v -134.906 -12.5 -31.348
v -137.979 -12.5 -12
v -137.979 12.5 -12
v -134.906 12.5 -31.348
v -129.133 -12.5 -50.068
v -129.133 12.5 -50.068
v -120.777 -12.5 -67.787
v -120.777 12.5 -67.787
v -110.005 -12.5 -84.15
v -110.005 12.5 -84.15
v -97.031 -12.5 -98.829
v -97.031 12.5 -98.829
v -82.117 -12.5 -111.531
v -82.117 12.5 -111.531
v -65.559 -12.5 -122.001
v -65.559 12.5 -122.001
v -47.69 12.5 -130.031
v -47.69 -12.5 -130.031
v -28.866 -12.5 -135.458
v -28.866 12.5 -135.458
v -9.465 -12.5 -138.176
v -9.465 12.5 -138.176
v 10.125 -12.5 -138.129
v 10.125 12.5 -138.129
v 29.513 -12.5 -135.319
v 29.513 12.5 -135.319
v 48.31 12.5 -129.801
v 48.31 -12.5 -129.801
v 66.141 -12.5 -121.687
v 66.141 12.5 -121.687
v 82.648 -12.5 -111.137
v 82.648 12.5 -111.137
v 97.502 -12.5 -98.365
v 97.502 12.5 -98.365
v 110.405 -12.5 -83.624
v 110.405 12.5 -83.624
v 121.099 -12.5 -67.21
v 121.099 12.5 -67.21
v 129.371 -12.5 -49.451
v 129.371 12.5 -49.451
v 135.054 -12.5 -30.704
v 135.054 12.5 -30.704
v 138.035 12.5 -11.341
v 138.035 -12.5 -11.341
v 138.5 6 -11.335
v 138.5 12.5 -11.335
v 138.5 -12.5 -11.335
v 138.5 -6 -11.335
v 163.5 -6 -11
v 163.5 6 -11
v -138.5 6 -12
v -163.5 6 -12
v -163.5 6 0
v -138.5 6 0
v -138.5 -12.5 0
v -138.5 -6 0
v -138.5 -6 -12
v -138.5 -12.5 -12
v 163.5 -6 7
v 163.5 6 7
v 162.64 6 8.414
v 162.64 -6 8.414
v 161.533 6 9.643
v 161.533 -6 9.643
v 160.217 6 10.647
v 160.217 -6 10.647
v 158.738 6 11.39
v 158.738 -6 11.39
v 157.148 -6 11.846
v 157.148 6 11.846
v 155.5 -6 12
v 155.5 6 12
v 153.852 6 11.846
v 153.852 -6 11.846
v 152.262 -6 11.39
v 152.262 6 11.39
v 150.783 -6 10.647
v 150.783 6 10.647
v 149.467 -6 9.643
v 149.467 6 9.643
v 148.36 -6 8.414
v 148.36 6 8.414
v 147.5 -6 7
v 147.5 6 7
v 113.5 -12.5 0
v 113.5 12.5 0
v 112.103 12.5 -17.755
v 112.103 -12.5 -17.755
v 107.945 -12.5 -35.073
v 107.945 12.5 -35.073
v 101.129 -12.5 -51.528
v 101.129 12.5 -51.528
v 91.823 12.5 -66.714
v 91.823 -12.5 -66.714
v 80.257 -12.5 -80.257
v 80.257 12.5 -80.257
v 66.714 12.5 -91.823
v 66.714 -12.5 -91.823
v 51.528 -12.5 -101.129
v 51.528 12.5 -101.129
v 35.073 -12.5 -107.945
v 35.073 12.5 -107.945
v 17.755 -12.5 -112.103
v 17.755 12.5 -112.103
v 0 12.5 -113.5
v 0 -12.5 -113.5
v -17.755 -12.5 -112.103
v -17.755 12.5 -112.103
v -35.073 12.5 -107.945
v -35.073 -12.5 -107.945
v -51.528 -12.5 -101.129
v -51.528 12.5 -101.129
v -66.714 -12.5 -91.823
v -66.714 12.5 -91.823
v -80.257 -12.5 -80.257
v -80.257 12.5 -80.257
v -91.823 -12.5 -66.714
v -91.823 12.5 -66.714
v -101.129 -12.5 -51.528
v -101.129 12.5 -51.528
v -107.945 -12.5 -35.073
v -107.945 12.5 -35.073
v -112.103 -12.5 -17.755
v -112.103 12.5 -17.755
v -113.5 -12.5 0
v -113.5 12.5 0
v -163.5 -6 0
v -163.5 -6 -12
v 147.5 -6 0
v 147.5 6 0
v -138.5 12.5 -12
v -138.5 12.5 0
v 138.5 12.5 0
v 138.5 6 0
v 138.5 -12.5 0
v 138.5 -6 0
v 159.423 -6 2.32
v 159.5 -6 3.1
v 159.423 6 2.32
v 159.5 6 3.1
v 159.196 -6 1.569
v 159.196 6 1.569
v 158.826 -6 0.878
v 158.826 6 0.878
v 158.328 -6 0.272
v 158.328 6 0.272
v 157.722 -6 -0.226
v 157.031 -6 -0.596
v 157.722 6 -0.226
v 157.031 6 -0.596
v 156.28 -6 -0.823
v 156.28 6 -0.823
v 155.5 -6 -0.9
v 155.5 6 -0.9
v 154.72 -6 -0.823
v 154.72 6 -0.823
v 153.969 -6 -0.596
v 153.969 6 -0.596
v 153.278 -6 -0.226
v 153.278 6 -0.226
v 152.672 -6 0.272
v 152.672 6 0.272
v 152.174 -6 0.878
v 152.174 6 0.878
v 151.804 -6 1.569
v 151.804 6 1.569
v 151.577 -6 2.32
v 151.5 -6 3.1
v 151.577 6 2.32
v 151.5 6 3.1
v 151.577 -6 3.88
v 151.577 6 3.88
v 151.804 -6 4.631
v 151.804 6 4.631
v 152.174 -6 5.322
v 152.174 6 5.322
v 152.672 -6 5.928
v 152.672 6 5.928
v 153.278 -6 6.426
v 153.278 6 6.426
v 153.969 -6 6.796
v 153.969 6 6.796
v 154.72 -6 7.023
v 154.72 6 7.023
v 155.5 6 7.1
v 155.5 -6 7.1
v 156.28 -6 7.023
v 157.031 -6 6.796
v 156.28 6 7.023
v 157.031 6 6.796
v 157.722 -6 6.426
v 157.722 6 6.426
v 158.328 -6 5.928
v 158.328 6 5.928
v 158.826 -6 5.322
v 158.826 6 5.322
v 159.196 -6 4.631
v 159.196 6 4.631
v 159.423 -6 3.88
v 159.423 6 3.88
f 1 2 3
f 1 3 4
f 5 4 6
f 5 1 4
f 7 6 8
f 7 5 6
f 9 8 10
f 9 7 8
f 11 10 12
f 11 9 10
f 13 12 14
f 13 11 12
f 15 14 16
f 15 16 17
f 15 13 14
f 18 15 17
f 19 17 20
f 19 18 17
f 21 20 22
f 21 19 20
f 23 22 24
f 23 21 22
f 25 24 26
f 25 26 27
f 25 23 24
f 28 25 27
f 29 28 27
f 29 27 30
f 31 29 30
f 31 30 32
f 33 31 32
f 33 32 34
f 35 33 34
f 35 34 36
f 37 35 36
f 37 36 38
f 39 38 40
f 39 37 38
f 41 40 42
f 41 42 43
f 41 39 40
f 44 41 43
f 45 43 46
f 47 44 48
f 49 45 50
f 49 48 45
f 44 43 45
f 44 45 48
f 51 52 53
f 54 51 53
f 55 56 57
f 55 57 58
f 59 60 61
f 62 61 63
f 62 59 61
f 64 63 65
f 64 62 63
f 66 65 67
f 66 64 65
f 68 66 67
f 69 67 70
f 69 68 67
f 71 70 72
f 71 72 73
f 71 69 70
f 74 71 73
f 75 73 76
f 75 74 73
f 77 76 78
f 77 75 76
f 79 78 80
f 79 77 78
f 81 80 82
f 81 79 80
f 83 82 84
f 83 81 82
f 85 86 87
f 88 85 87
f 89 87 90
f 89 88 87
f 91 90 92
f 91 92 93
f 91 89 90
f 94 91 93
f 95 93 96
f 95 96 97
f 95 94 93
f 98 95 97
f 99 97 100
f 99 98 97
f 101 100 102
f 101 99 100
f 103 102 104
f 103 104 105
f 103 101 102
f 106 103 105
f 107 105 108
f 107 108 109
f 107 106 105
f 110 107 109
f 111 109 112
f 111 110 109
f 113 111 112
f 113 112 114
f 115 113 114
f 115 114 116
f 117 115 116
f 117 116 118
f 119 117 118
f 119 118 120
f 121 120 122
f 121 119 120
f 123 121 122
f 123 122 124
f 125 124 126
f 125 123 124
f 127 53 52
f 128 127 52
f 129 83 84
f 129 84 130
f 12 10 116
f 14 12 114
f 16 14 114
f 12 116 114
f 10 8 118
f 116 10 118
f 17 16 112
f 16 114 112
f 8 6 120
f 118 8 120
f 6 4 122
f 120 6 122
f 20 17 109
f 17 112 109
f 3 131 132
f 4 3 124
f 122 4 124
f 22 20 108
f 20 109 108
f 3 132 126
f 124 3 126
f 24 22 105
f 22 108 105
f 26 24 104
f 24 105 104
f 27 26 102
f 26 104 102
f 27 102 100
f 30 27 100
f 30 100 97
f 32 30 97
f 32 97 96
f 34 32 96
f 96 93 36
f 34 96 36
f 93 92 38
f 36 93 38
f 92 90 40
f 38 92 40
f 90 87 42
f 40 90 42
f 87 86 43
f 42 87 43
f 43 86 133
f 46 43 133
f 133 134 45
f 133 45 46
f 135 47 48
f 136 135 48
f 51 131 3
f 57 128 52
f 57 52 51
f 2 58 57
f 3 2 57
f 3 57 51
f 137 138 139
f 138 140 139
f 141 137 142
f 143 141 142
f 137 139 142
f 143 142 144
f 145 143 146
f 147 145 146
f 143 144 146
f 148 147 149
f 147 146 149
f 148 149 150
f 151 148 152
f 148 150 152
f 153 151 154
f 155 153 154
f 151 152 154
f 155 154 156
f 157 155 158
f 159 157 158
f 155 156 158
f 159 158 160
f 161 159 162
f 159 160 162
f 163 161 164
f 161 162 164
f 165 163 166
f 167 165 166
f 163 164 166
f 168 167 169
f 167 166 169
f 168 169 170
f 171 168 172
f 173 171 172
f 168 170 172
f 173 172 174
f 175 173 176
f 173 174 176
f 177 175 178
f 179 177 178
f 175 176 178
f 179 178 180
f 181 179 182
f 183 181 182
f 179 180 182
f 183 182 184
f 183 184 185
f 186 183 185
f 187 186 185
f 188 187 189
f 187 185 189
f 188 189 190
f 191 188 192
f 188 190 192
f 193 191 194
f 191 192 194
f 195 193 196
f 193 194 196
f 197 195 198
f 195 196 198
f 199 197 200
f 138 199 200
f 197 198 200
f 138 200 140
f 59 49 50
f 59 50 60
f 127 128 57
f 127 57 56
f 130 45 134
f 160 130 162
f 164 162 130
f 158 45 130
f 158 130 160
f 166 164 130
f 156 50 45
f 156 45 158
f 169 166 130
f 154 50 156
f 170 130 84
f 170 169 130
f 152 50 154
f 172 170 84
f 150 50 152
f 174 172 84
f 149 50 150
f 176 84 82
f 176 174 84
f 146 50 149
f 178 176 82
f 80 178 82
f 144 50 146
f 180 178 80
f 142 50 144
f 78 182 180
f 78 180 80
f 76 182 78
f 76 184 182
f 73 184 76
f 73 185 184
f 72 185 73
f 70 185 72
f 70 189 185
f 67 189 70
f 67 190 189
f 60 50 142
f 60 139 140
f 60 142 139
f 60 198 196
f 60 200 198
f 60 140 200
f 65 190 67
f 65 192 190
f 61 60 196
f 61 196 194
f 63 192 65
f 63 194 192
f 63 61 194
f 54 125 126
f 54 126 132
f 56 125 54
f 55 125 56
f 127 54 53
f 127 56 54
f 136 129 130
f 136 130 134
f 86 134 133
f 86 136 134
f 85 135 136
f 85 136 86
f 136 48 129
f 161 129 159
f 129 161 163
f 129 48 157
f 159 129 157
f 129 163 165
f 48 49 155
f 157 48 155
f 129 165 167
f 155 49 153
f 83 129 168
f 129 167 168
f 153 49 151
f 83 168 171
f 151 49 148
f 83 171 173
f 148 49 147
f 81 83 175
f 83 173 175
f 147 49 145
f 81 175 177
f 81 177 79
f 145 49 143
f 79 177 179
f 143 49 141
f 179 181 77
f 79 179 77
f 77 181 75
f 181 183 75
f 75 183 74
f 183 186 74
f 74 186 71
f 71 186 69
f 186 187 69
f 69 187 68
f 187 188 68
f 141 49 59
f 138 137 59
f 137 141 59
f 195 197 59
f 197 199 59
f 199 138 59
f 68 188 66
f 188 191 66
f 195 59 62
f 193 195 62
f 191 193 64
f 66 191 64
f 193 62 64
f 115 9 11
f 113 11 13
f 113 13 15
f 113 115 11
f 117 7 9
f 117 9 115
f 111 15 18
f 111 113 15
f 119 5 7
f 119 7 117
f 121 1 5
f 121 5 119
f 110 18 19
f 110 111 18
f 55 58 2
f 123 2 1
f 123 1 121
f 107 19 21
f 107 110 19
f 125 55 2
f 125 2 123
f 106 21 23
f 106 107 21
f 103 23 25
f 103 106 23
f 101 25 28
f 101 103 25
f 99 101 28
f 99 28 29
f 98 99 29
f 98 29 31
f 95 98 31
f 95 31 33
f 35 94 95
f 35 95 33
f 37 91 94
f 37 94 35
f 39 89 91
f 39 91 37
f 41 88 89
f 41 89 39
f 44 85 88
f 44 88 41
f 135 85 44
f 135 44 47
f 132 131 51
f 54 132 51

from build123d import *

# Parameters (mm, degrees)
F1_DEPTH = 12.5
F2_W     = 8.6661115155
F2_H     = 37.1920648861
F2_W_2   = 11.7714676749
F2_H_2   = 37.3365031319
F3_DEPTH = 25
F4_W     = 10.3762667931
F4_H     = 26.0754239581
F4_W_2   = 12.8692660095
F4_H_2   = 27.2882347388
F5_DEPTH = 25


with BuildPart() as f1:
    # F0 (on Front) → F1 (new body, symmetric)
    with BuildSketch(Plane.XZ):
        with BuildLine():
            ThreePointArc((113.5, 0), (0, -113.5), (-113.5, 0))
            Line((-113.5, 0), (-138.5, 0))
            Line((-138.5, 0), (-163.5, 0))
            Line((-163.5, 0), (-163.5, -12))
            Line((-163.5, -12), (-137.9791650939, -12))
            ThreePointArc((-137.9791650939, -12), (0.3305438412, -138.4996055618), (138.0348714685, -11.3412635401))
            Line((138.0348714685, -11.3412635401), (163.5, -11))
            Line((163.5, -11), (163.5, 0))
            Line((163.5, 0), (158.027844932, 0))
            ThreePointArc((158.027844932, 0), (155.5, -0.9), (152.972155068, 0))
            Line((152.972155068, 0), (147.5, 0))
            Line((147.5, 0), (138.5, 0))
            Line((138.5, 0), (113.5, 0))
        make_face()
        with BuildLine():
            Line((147.5, 7), (147.5, 0))
            Line((147.5, 0), (152.972155068, 0))
            ThreePointArc((152.972155068, 0), (153.7841007792, 6.7132658169), (159.5, 3.1))
            ThreePointArc((159.5, 3.1), (159.1132658169, 1.3841007792), (158.027844932, 0))
            Line((158.027844932, 0), (163.5, 0))
            Line((163.5, 0), (163.5, 7))
            ThreePointArc((163.5, 7), (155.5, 12), (147.5, 7))
        make_face()
    extrude(amount=F1_DEPTH, both=True)

    # F2 (on face) → F3 (cut)
    with BuildSketch(Plane.YZ.offset(163.5)):
        with Locations((-10.3330557577, -0.399579161)):
            Rectangle(F2_W, F2_H)
        with Locations((11.8857338375, -1.6272780021)):
            Rectangle(F2_W_2, F2_H_2)
    extrude(amount=-F3_DEPTH, mode=Mode.SUBTRACT)

    # F4 (on face) → F5 (cut)
    with BuildSketch(Plane(origin=(-163.5, 0, 0), x_dir=(0, -1, 0), z_dir=(-1, 0, 0))):
        with Locations((-11.1881333965, -6.0408366425)):
            Rectangle(F4_W, F4_H)
        with Locations((12.4346330048, -6.9841346379)):
            Rectangle(F4_W_2, F4_H_2)
    extrude(amount=-F5_DEPTH, mode=Mode.SUBTRACT)


solid = f1.part
